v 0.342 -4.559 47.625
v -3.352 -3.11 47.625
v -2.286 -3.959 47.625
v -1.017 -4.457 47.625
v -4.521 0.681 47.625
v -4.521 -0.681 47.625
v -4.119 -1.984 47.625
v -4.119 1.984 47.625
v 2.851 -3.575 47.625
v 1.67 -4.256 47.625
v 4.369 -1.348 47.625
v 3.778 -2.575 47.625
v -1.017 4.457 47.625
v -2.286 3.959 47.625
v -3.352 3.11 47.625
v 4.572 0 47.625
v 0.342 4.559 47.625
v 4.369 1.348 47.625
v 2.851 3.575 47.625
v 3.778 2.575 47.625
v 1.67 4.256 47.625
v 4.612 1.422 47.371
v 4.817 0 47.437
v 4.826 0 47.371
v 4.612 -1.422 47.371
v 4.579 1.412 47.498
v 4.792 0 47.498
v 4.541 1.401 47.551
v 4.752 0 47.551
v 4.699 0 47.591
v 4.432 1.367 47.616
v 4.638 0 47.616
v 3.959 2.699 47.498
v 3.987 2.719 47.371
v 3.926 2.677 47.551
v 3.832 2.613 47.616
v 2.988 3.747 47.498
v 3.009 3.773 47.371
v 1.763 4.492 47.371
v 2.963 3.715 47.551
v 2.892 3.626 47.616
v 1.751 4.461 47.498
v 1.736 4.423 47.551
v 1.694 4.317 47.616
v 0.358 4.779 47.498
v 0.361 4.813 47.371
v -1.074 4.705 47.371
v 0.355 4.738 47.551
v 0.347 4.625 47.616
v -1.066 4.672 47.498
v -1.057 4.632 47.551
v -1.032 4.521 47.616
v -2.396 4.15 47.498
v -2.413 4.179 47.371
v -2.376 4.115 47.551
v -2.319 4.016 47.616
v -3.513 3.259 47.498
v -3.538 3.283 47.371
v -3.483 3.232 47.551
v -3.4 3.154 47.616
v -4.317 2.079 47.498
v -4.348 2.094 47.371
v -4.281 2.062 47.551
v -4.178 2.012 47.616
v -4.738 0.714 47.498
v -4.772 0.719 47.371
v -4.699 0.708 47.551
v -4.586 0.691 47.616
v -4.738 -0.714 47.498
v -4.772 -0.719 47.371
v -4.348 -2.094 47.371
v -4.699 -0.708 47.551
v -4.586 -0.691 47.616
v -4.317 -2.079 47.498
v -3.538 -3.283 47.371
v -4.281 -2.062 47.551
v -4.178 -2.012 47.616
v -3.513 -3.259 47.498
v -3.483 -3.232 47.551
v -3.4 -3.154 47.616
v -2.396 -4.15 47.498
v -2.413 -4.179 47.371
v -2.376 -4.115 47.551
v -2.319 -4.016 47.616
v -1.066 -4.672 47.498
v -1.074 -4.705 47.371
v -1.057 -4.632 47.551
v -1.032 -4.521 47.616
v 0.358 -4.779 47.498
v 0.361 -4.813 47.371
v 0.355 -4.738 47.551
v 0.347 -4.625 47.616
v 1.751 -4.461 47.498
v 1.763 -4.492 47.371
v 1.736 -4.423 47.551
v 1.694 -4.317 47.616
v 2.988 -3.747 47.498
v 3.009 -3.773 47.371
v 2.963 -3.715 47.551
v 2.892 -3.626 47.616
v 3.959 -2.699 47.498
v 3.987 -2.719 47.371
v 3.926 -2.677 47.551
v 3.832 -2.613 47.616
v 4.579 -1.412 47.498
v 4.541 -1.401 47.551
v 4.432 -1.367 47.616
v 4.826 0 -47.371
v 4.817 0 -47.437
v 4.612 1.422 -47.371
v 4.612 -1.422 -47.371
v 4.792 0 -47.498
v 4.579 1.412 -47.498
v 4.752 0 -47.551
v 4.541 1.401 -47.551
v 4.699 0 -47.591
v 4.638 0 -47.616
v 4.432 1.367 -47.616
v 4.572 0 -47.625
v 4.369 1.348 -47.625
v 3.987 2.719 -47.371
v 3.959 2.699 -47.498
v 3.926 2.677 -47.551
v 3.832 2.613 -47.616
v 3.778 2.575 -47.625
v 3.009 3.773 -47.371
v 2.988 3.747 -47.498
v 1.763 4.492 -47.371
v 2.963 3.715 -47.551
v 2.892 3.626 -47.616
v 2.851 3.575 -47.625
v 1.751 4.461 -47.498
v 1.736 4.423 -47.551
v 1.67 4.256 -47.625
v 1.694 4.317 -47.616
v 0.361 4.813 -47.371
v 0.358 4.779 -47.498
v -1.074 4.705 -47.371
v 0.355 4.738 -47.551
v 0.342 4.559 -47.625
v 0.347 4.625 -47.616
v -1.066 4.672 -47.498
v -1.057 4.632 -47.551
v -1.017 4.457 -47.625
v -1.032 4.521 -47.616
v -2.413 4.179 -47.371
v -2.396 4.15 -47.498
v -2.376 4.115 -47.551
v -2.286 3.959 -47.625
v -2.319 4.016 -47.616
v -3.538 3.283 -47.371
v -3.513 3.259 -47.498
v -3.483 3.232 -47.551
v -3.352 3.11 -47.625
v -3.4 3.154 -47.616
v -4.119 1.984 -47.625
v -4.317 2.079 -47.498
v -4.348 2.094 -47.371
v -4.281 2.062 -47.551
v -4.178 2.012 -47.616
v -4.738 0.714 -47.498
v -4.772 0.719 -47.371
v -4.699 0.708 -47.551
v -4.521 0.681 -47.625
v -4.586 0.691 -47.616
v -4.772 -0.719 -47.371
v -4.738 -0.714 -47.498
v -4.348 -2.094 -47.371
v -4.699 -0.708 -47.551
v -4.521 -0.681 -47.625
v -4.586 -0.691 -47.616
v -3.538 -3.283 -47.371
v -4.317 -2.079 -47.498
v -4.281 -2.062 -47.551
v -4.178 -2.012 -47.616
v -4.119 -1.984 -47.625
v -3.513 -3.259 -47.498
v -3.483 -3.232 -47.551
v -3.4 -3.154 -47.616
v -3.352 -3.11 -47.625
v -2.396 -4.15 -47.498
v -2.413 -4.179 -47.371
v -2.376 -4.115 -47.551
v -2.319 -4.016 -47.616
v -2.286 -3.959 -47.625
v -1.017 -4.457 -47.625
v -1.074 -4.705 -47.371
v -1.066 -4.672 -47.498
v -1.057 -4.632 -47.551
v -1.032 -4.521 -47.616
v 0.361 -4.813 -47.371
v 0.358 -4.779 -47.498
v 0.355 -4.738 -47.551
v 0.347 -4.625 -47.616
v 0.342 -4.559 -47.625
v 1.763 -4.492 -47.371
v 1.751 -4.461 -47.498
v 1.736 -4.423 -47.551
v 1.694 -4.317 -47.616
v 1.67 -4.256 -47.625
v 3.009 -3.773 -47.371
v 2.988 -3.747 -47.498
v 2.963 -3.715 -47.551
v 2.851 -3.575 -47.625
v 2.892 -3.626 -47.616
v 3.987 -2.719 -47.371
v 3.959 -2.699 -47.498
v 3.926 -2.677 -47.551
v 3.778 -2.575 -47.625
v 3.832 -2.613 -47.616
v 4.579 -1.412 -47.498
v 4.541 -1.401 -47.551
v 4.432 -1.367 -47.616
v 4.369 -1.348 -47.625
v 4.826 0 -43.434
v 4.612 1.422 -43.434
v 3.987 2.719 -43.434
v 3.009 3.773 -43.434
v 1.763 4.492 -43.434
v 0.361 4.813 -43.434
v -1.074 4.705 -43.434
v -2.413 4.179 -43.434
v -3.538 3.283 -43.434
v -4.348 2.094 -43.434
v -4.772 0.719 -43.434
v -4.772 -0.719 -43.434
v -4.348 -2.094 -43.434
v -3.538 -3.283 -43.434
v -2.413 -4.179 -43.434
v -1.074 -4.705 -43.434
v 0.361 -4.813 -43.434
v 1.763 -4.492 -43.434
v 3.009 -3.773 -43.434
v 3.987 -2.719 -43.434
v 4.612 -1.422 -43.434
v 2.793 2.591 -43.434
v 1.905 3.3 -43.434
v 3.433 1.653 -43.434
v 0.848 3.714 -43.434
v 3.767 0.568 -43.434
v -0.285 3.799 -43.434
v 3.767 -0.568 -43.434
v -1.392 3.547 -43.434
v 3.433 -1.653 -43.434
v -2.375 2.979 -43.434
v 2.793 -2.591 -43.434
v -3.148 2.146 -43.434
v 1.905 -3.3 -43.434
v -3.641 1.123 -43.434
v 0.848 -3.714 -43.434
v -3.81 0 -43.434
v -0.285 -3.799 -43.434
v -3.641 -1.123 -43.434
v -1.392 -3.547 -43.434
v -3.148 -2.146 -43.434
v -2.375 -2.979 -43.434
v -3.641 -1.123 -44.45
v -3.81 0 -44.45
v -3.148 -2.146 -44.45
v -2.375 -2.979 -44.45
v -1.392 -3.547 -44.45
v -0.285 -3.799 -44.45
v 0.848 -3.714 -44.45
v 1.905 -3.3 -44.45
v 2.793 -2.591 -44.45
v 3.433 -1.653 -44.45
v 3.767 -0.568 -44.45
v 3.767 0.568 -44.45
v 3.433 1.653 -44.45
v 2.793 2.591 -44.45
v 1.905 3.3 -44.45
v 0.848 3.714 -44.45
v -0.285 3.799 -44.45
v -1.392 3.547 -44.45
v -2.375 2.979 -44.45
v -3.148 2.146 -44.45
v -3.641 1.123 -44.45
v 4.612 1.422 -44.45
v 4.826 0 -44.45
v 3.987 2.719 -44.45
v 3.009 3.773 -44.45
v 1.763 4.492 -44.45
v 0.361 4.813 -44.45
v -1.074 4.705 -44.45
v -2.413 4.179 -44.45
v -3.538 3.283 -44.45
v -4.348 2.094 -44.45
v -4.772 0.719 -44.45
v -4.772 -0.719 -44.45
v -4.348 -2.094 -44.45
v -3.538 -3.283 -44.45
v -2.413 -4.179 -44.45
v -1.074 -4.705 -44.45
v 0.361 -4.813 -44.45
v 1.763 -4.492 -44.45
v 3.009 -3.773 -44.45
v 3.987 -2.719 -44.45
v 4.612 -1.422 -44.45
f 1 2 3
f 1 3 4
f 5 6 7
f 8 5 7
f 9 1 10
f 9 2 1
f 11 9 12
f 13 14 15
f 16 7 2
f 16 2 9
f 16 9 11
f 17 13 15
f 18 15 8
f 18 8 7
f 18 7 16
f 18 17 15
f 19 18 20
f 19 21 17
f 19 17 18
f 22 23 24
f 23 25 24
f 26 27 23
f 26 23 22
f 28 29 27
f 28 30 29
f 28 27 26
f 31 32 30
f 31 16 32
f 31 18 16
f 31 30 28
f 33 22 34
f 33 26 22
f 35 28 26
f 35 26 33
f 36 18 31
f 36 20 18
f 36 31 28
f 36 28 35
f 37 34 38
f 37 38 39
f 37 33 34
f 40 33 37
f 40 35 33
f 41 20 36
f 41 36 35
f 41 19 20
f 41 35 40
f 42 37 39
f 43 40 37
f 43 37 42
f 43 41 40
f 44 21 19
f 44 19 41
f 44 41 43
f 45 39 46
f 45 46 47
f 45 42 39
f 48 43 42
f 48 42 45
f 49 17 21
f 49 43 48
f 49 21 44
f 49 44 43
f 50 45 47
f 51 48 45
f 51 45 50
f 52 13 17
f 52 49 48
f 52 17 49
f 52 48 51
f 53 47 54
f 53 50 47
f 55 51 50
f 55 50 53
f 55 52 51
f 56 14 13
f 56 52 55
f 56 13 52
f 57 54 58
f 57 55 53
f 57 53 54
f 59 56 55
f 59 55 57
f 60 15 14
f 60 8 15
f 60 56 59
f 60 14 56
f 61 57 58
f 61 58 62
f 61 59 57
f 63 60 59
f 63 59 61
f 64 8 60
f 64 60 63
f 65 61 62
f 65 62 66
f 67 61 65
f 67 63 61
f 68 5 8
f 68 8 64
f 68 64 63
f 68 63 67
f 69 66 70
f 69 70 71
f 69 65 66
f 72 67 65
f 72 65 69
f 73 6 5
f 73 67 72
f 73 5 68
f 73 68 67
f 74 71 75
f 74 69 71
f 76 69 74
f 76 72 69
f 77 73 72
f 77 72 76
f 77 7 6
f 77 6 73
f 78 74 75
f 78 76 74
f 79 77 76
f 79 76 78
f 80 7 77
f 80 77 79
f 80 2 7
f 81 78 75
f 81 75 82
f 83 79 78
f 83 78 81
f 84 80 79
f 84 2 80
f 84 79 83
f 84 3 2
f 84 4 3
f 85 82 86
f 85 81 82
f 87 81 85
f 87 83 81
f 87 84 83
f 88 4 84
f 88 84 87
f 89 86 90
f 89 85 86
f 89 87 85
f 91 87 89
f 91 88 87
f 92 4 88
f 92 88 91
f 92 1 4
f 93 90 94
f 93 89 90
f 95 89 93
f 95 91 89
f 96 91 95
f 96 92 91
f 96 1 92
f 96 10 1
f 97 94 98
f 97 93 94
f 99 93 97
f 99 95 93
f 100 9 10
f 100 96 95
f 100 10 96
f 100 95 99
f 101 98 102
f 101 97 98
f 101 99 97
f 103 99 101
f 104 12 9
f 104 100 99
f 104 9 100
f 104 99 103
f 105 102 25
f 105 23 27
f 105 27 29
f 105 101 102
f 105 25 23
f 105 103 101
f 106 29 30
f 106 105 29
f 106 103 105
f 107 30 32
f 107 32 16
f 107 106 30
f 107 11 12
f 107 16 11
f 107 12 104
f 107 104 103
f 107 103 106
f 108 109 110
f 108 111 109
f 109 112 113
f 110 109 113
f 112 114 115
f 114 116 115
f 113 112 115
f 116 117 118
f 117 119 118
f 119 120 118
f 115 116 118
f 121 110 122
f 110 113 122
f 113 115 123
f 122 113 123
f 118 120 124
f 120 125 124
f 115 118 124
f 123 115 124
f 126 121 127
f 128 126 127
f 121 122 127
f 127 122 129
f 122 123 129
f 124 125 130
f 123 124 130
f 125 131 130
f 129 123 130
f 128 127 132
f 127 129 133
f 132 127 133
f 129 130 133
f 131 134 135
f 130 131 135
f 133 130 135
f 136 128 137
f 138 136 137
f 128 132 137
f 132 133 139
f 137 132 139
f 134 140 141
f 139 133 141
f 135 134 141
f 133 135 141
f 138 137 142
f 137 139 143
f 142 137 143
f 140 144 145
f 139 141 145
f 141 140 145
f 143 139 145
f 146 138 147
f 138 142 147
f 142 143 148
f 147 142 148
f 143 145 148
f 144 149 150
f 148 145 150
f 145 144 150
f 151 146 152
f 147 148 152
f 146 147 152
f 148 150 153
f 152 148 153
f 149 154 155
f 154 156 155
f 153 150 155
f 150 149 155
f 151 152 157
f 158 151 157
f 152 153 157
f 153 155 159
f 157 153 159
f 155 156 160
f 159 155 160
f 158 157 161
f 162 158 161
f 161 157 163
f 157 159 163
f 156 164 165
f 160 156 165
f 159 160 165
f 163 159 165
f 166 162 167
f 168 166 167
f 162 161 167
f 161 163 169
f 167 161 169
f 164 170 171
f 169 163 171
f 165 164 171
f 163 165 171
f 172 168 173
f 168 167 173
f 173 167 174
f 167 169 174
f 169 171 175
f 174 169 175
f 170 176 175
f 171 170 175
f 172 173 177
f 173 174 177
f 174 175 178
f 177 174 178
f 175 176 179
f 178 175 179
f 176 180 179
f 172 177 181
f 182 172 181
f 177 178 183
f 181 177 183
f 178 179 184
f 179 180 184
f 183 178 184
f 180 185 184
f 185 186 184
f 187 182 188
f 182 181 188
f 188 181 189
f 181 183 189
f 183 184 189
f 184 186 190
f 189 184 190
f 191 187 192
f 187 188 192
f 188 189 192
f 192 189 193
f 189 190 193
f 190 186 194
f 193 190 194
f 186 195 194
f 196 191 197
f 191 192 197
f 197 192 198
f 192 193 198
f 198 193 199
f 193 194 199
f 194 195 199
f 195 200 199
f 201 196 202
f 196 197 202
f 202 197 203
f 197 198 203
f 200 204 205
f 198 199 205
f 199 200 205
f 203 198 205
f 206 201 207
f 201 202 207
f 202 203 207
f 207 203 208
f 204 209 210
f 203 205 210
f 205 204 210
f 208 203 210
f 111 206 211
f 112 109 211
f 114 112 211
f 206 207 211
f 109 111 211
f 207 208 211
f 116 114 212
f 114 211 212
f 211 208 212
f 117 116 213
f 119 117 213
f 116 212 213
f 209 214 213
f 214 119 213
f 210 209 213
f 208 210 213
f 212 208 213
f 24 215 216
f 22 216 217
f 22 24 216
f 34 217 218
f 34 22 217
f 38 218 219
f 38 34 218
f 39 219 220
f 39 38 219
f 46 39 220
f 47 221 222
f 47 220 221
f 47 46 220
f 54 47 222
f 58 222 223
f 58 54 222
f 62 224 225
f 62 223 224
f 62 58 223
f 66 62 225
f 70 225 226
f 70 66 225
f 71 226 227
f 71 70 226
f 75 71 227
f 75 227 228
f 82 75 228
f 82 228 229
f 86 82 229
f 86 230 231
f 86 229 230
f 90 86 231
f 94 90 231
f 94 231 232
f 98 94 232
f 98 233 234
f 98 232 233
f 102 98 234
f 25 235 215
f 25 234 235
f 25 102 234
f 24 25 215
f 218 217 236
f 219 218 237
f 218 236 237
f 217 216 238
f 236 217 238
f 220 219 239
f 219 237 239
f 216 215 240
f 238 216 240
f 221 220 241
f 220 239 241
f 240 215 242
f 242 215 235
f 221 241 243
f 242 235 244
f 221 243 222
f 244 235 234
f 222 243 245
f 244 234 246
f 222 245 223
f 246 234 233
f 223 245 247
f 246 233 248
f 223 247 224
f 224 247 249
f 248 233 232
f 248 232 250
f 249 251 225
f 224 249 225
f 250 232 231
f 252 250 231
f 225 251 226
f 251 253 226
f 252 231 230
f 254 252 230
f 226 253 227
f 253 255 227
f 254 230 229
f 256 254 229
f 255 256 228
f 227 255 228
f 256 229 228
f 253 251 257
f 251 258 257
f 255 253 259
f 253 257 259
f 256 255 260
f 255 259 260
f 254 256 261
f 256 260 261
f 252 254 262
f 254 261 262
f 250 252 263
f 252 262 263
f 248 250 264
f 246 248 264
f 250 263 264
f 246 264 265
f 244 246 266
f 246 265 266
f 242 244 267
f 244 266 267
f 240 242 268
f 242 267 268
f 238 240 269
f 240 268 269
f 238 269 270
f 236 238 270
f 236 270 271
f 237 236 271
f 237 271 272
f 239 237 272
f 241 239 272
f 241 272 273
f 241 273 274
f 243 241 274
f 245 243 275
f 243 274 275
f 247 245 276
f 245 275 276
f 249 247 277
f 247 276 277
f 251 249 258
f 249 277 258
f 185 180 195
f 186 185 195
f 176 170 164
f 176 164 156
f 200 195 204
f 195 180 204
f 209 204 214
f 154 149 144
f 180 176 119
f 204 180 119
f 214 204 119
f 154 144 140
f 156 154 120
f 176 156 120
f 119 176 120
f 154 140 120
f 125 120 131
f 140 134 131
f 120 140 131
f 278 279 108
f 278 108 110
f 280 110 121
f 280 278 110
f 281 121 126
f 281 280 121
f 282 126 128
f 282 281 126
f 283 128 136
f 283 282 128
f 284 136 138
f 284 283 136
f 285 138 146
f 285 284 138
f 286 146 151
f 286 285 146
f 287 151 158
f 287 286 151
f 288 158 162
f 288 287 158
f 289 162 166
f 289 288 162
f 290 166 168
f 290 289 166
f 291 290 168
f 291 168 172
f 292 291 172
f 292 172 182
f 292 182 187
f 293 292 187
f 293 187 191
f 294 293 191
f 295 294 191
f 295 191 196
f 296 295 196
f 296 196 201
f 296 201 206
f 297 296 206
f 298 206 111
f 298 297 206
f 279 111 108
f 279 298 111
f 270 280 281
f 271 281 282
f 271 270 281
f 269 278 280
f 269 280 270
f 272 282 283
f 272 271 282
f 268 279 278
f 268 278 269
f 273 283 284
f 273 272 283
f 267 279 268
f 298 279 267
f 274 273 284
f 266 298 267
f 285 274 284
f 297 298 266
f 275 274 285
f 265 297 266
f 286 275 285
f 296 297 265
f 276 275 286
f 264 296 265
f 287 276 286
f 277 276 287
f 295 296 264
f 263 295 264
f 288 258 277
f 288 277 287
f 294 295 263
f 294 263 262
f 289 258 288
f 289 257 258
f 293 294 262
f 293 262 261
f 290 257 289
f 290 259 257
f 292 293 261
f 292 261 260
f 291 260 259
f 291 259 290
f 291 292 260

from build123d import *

# Parameters (mm, degrees)
SKETCH1_R           = 4.826
BOSS_EXTRUDE1_DEPTH = 47.625
SKETCH2_W           = 1.016
SKETCH2_H           = 1.016
FILLET1_R           = 0.254


with BuildPart() as part:
    # Sketch1 → Boss-Extrude1 (new, symmetric)
    with BuildSketch(Plane.XY):
        Circle(SKETCH1_R)
    extrude(amount=BOSS_EXTRUDE1_DEPTH, both=True)

    # Sketch2 → Cut-Revolve1 (revolve, cut)
    with BuildSketch(Plane(origin=(0, 0, 0), x_dir=(1, 0, 0), z_dir=(0, 1, 0))):
        with Locations((-4.318, 43.942)):
            Rectangle(SKETCH2_W, SKETCH2_H)
    revolve(axis=Axis((0, 0, -52.012367131), (0, 0, 1)), mode=Mode.SUBTRACT)

    # Fillet1
    fillet1_edges = [part.edges().sort_by_distance(p)[0] for p in [
        (-4.826, 0, -47.625),
        (-4.826, 0, 47.625),
    ]]
    fillet(fillet1_edges, radius=FILLET1_R)


solid = part.part
